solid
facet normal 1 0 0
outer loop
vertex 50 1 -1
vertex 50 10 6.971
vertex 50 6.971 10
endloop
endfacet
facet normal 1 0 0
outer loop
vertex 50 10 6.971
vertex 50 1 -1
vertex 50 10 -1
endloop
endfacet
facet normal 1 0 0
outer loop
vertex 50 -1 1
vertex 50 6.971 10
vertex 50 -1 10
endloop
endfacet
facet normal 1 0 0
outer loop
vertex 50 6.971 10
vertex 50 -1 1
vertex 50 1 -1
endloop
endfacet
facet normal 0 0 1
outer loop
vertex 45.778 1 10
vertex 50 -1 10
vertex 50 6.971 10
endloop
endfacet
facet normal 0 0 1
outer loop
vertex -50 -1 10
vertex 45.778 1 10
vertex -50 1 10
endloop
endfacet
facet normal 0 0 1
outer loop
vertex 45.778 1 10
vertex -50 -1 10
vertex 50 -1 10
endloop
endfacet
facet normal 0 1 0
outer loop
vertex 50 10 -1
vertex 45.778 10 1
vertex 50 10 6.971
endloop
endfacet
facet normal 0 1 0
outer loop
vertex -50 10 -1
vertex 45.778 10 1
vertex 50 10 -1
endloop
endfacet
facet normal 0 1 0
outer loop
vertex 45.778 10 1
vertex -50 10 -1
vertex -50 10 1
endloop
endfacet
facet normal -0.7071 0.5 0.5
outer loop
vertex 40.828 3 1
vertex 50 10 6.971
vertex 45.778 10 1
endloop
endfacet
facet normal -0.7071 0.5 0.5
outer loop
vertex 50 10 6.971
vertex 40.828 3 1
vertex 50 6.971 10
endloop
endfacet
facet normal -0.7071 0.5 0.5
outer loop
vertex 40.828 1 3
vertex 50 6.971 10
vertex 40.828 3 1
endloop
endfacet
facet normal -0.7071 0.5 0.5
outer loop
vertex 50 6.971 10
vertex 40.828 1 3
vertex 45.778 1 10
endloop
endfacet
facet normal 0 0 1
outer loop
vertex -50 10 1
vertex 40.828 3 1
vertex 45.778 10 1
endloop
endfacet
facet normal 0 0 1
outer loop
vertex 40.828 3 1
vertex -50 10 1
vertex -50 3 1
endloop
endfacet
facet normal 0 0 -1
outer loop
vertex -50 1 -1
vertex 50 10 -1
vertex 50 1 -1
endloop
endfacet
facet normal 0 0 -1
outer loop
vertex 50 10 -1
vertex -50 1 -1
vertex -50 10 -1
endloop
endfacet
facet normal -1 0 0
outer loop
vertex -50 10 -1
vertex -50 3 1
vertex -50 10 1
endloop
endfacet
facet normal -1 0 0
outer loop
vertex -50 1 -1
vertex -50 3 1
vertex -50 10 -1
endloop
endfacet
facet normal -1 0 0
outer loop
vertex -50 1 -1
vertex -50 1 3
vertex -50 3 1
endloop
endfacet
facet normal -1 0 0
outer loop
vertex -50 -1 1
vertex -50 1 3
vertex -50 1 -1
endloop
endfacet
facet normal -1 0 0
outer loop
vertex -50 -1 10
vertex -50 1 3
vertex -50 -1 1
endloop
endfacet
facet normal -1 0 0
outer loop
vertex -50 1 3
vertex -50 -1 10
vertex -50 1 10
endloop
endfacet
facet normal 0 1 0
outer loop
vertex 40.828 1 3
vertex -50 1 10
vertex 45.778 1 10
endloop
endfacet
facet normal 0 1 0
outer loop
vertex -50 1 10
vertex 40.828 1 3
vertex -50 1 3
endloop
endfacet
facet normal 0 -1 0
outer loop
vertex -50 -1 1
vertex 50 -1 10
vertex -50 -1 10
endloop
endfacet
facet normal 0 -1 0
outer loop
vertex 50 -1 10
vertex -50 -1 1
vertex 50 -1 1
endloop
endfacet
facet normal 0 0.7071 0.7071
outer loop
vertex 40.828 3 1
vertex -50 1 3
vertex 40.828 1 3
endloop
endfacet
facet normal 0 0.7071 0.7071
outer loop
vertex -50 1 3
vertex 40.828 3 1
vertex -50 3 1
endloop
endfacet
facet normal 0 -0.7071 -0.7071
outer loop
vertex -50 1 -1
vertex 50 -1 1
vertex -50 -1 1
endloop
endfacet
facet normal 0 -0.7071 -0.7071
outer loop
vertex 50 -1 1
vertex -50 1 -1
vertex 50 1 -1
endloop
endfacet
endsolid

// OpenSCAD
H=100;
W=10;
D=2;

difference() 
{
    union () {
        translate([0,W/2,0]) cube([H,W,D],center=true);
        translate([0,0,W/2]) cube([H,D,W],center=true);
        translate([0,D,D]) rotate([45,0,0]) translate([0,-D/2,0]) cube([H,D,2*D],center=true);    
        difference() 
        {
            translate([H/2-W/2,W/2,W/2]) cube([W,W,W],center=true);
            translate([H/2-1.2*W,W,W])
            rotate([-45,0,0]) 
            rotate([0,-45,0]) 
            cube([2*W,2*W,2*W],center=true);
        }
    }
    rotate([45,0,0]) translate([0,-W/2,0]) cube([2*H,W,W],center=true);
}
